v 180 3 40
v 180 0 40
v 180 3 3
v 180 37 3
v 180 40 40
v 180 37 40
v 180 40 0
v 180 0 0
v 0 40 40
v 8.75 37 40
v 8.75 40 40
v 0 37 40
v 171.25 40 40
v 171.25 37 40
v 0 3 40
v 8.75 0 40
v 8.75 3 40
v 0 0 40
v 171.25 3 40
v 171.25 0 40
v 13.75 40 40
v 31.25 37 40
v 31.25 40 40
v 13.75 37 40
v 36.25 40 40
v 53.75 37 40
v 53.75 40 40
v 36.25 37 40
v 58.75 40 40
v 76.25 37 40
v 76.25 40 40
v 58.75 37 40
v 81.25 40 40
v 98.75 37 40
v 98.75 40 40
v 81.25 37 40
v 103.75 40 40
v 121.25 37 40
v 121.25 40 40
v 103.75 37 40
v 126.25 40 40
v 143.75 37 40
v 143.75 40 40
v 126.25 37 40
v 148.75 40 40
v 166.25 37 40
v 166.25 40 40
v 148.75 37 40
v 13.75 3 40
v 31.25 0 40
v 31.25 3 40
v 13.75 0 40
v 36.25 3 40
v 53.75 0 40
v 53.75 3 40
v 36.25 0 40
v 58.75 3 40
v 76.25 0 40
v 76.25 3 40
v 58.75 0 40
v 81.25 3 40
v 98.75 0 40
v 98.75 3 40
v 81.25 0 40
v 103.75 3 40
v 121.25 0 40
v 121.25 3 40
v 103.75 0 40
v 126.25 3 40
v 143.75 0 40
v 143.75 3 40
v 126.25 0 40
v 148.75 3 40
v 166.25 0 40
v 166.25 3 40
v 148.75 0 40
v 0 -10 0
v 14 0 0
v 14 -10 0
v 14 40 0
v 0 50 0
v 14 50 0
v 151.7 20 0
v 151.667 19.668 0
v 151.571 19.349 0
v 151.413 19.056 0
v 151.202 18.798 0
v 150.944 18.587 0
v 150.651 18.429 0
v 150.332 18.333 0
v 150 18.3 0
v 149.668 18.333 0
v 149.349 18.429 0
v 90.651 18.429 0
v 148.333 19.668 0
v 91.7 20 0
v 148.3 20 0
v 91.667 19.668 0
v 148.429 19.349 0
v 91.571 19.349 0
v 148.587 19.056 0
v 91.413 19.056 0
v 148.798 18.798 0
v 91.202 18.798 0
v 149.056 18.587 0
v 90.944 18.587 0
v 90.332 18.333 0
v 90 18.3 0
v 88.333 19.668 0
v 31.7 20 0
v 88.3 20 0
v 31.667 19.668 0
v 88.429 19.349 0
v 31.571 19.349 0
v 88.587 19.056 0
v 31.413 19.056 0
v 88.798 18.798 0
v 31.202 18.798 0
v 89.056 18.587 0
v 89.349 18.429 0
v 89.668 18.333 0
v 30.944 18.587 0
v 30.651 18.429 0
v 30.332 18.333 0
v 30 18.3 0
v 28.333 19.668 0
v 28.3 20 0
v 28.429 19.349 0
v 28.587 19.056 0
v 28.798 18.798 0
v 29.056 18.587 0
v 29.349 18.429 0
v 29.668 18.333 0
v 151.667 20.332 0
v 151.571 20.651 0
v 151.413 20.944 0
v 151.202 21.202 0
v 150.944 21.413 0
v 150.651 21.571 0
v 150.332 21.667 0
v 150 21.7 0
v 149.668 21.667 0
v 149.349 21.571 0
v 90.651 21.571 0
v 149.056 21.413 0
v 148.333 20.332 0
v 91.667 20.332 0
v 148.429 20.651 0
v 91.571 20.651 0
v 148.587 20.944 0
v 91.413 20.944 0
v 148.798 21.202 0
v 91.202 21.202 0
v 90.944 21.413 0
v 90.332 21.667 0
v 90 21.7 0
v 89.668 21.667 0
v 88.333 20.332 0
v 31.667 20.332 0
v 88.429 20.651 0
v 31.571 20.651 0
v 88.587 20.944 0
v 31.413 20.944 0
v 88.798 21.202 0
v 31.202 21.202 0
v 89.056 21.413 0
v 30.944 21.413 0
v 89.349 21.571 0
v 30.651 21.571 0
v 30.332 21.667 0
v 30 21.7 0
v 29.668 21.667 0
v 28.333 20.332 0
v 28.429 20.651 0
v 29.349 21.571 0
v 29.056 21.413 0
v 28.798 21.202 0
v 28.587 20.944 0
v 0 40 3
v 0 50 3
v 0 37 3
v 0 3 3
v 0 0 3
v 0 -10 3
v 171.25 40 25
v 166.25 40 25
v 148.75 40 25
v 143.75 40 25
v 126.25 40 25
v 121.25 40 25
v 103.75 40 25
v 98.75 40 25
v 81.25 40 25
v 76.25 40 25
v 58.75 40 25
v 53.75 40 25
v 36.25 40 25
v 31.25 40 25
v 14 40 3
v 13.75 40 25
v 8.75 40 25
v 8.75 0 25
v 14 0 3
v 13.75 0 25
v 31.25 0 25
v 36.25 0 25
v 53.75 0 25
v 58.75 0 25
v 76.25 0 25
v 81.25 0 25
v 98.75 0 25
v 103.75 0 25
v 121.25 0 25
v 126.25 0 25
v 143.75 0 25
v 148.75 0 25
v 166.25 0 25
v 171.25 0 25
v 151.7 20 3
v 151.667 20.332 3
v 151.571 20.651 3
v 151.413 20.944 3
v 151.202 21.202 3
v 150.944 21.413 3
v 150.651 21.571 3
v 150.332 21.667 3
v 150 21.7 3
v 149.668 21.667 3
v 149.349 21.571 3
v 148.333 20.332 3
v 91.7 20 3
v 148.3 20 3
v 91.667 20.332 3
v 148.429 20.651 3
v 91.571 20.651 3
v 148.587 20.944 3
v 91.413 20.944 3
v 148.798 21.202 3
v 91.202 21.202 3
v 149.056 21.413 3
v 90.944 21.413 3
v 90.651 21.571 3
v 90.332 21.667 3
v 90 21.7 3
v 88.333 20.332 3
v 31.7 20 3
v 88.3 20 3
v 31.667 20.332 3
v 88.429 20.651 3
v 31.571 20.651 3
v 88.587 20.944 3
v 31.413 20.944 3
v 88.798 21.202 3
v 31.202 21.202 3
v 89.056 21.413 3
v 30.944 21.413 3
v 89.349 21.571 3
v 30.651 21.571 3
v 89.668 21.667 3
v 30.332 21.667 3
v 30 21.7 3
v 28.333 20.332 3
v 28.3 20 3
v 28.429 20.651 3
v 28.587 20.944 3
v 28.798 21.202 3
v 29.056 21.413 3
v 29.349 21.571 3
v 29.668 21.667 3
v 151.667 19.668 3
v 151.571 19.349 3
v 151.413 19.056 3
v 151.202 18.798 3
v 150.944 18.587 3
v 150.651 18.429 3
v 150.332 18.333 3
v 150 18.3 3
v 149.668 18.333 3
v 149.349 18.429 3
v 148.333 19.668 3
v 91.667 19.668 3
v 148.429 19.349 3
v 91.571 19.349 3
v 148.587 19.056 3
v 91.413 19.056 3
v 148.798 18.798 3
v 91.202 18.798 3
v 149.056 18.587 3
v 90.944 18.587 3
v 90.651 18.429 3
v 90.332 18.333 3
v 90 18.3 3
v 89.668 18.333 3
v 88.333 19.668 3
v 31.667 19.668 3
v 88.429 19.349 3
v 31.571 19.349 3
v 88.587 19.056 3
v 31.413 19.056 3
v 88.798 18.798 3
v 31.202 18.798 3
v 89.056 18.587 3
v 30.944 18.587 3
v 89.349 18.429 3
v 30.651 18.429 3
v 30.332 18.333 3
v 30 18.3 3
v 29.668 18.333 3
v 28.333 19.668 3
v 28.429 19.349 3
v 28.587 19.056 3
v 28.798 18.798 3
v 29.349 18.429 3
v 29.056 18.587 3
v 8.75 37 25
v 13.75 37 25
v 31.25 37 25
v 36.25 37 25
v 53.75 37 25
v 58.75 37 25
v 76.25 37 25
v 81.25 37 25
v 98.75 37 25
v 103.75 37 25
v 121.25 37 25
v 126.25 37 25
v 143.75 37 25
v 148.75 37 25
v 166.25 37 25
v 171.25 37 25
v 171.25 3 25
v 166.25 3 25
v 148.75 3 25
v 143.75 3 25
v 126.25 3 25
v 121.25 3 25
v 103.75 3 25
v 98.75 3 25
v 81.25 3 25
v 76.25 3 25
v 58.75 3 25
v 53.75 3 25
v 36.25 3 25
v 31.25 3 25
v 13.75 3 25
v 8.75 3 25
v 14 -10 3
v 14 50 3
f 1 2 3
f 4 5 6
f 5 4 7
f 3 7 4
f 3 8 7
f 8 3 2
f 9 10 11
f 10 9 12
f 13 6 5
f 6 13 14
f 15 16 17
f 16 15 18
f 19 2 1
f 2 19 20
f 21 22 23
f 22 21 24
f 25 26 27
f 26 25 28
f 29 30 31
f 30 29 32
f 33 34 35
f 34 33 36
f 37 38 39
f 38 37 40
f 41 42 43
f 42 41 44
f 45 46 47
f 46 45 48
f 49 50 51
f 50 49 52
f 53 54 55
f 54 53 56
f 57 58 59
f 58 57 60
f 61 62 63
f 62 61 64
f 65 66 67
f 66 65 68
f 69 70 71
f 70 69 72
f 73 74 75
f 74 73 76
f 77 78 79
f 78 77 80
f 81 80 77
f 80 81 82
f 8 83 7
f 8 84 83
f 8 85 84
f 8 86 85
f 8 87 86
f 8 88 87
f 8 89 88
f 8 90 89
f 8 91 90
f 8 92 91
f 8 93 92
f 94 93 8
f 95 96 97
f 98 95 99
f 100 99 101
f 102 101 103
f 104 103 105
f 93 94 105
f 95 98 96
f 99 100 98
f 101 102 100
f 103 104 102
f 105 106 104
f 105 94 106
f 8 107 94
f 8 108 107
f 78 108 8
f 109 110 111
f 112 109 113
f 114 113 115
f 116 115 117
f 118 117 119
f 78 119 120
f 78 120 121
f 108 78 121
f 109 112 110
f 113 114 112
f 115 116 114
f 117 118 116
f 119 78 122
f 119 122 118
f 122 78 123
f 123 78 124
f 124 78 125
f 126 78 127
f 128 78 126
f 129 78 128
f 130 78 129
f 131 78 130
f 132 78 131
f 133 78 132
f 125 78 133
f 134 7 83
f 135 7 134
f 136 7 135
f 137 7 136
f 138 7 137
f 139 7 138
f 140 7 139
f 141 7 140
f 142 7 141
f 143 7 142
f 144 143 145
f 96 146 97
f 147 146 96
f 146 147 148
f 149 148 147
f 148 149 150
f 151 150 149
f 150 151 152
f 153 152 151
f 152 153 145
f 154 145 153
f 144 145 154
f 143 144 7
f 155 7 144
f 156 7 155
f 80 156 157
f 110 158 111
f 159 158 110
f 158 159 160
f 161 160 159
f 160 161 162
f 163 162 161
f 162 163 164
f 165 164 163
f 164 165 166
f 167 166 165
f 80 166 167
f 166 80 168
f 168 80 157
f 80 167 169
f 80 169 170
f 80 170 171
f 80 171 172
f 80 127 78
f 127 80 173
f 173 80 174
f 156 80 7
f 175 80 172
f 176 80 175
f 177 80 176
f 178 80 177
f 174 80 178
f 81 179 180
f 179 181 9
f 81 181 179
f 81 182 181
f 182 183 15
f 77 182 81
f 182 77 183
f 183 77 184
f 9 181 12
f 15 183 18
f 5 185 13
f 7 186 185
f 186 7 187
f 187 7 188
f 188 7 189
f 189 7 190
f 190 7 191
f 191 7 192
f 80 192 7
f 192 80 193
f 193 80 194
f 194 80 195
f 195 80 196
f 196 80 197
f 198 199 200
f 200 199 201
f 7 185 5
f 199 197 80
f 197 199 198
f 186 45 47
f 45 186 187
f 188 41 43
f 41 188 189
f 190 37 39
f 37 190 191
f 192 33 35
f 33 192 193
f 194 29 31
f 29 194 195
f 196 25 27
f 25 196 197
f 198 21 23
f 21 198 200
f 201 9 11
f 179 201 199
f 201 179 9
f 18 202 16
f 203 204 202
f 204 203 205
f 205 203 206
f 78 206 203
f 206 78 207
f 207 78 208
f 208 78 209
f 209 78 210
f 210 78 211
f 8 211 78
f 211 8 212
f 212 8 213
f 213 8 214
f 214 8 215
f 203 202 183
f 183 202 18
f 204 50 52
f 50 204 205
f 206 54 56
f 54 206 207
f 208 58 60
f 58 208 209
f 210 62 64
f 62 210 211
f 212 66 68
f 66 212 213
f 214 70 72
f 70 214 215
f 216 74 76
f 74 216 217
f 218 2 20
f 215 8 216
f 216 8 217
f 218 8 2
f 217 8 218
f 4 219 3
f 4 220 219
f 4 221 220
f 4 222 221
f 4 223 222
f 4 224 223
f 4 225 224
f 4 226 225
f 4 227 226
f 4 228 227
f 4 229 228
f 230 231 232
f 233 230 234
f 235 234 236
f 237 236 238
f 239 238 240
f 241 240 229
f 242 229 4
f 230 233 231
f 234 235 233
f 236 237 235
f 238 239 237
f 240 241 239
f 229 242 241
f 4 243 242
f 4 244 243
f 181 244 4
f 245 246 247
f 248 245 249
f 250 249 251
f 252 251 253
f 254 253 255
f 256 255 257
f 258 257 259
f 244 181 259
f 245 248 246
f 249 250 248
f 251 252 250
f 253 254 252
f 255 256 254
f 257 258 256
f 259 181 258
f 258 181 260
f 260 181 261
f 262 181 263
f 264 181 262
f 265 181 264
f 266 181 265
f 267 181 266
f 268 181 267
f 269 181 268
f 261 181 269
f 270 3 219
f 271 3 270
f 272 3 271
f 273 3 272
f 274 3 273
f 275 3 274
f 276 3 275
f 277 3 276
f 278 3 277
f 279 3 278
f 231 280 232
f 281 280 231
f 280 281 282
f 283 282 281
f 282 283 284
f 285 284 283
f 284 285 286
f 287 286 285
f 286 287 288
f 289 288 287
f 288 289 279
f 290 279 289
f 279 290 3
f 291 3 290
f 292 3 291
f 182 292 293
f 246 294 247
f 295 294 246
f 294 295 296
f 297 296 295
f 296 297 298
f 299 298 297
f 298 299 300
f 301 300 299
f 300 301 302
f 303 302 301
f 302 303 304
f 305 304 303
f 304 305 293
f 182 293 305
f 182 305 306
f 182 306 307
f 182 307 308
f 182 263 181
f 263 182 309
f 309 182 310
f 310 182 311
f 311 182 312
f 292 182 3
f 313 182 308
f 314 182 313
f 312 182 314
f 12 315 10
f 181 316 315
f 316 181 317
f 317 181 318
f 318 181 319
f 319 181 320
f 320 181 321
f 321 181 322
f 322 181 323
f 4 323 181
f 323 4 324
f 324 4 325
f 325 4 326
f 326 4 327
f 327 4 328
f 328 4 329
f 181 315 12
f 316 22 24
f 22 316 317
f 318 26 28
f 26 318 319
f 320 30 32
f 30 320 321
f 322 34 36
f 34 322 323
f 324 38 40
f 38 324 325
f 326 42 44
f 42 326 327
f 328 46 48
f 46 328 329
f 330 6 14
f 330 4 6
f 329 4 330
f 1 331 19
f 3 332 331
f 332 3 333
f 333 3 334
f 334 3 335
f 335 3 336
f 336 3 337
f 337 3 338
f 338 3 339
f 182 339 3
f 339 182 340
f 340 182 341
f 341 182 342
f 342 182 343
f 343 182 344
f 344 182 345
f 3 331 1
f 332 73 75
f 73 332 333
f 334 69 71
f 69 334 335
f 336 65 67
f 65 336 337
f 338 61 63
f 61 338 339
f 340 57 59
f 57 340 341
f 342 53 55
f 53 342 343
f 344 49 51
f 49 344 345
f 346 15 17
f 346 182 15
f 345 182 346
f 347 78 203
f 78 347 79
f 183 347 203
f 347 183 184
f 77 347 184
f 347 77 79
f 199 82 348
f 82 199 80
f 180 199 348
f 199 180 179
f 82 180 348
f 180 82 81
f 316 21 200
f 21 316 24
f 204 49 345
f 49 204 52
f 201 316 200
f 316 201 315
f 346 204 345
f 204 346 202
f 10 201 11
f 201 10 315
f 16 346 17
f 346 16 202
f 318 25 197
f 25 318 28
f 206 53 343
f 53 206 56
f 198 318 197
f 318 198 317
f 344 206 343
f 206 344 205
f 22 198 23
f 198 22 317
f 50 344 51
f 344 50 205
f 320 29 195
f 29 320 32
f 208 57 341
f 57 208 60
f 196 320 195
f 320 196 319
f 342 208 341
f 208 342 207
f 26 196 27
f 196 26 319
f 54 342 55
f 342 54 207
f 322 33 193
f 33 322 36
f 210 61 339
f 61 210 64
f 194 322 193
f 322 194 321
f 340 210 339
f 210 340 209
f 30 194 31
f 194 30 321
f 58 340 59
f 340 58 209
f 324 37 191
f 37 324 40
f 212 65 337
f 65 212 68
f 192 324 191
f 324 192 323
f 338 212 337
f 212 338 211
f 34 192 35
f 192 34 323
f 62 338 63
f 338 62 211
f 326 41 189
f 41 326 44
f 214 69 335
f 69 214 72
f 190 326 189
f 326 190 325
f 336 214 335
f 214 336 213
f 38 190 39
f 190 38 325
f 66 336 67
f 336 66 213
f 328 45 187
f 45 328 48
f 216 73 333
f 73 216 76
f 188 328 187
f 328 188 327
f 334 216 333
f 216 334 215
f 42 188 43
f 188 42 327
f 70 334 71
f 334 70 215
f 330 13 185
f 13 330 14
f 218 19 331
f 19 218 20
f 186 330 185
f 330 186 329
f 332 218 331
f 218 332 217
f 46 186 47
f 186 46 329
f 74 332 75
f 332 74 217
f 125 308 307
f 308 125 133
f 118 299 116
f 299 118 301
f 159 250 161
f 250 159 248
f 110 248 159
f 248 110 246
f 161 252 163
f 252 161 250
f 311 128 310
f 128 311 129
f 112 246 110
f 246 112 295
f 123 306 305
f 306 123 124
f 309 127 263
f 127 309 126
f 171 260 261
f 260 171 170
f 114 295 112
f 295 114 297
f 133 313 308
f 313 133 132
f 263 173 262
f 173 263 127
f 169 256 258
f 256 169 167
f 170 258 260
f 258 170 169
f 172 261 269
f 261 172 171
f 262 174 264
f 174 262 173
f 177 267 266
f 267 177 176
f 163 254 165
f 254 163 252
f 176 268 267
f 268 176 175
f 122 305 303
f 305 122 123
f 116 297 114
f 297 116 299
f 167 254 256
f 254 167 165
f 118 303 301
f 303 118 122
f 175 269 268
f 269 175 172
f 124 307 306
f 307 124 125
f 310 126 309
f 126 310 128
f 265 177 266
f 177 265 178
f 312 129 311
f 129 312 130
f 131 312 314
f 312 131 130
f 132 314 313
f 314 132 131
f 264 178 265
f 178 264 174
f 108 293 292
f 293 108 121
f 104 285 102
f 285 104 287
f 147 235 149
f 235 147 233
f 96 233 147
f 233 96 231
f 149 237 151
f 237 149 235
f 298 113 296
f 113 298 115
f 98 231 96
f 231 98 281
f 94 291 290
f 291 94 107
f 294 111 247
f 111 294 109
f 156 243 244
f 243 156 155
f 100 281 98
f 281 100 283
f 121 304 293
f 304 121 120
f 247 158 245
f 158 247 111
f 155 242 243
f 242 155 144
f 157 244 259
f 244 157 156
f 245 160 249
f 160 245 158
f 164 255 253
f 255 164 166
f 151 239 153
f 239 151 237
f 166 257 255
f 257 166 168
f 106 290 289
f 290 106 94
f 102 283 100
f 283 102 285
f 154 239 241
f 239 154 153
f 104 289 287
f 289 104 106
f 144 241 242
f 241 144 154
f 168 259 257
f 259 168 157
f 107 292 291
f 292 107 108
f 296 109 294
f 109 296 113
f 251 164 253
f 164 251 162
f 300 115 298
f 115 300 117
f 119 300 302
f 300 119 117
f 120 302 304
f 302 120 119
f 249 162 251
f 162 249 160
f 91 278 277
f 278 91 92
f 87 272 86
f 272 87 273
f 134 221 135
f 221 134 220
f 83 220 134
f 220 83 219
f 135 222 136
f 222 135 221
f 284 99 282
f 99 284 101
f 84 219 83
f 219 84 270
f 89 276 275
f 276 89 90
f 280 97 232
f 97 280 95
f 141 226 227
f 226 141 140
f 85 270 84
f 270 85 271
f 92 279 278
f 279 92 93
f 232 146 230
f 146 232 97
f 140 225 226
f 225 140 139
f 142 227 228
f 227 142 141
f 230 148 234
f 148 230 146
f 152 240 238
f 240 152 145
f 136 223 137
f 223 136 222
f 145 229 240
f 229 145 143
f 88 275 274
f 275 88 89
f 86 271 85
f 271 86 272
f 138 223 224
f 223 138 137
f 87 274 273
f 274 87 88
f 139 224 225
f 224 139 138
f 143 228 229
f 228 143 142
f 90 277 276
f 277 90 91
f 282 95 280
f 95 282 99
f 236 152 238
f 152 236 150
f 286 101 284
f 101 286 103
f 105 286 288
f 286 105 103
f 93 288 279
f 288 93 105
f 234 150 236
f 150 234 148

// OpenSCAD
$fn = 32;

// ----------------------------------------------------------------------
// Cable duct: 180 x 40 x 40 mm, 8 fingers
// ----------------------------------------------------------------------

// --- parameters (mm) ---
duct_len = 180;           // duct length, X
duct_w = 40;              // duct width, Y
duct_h = 40;              // duct height, Z
wall_t = 3;               // side wall thickness
floor_t = 3;              // floor thickness
slot_w = 5;               // finger slot width
slot_h = 22;              // finger slot height
fingers = 8;              // number of finger slots per side
pitch = 22.5;             // finger pitch
hole_d = 3.4;             // floor mounting hole
hole_n = 3;               // mounting holes in the floor
ear_w = 11;               // mounting ear width
ear_l = 14;               // mounting ear length

module shell() {
  difference() {
    cube([duct_len, duct_w, duct_h]);
    /* open top channel */
    translate([-wall_t - 1, wall_t, floor_t])
      cube([duct_len + 2 * wall_t + 2, duct_w - 2 * wall_t, duct_h + 1]);
  }
}

module ears() {
  translate([0, -ear_w + 1, 0]) cube([ear_l, ear_w, floor_t]);
  translate([0, duct_w - 1, 0]) cube([ear_l, ear_w, floor_t]);
}

difference() {
  union() {
    shell();
    ears();
  }
  /* finger slots cut through both side walls */
  for (i = [0 : fingers - 1]) translate([pitch / 2 + i * pitch - slot_w / 2, -1, floor_t + slot_h]) cube([slot_w, duct_w + 2, duct_h]);
  for (i = [0 : hole_n - 1]) translate([(duct_len / hole_n) * (i + 0.5), duct_w / 2, -1]) cylinder(h = floor_t + 2, d = hole_d);
}
